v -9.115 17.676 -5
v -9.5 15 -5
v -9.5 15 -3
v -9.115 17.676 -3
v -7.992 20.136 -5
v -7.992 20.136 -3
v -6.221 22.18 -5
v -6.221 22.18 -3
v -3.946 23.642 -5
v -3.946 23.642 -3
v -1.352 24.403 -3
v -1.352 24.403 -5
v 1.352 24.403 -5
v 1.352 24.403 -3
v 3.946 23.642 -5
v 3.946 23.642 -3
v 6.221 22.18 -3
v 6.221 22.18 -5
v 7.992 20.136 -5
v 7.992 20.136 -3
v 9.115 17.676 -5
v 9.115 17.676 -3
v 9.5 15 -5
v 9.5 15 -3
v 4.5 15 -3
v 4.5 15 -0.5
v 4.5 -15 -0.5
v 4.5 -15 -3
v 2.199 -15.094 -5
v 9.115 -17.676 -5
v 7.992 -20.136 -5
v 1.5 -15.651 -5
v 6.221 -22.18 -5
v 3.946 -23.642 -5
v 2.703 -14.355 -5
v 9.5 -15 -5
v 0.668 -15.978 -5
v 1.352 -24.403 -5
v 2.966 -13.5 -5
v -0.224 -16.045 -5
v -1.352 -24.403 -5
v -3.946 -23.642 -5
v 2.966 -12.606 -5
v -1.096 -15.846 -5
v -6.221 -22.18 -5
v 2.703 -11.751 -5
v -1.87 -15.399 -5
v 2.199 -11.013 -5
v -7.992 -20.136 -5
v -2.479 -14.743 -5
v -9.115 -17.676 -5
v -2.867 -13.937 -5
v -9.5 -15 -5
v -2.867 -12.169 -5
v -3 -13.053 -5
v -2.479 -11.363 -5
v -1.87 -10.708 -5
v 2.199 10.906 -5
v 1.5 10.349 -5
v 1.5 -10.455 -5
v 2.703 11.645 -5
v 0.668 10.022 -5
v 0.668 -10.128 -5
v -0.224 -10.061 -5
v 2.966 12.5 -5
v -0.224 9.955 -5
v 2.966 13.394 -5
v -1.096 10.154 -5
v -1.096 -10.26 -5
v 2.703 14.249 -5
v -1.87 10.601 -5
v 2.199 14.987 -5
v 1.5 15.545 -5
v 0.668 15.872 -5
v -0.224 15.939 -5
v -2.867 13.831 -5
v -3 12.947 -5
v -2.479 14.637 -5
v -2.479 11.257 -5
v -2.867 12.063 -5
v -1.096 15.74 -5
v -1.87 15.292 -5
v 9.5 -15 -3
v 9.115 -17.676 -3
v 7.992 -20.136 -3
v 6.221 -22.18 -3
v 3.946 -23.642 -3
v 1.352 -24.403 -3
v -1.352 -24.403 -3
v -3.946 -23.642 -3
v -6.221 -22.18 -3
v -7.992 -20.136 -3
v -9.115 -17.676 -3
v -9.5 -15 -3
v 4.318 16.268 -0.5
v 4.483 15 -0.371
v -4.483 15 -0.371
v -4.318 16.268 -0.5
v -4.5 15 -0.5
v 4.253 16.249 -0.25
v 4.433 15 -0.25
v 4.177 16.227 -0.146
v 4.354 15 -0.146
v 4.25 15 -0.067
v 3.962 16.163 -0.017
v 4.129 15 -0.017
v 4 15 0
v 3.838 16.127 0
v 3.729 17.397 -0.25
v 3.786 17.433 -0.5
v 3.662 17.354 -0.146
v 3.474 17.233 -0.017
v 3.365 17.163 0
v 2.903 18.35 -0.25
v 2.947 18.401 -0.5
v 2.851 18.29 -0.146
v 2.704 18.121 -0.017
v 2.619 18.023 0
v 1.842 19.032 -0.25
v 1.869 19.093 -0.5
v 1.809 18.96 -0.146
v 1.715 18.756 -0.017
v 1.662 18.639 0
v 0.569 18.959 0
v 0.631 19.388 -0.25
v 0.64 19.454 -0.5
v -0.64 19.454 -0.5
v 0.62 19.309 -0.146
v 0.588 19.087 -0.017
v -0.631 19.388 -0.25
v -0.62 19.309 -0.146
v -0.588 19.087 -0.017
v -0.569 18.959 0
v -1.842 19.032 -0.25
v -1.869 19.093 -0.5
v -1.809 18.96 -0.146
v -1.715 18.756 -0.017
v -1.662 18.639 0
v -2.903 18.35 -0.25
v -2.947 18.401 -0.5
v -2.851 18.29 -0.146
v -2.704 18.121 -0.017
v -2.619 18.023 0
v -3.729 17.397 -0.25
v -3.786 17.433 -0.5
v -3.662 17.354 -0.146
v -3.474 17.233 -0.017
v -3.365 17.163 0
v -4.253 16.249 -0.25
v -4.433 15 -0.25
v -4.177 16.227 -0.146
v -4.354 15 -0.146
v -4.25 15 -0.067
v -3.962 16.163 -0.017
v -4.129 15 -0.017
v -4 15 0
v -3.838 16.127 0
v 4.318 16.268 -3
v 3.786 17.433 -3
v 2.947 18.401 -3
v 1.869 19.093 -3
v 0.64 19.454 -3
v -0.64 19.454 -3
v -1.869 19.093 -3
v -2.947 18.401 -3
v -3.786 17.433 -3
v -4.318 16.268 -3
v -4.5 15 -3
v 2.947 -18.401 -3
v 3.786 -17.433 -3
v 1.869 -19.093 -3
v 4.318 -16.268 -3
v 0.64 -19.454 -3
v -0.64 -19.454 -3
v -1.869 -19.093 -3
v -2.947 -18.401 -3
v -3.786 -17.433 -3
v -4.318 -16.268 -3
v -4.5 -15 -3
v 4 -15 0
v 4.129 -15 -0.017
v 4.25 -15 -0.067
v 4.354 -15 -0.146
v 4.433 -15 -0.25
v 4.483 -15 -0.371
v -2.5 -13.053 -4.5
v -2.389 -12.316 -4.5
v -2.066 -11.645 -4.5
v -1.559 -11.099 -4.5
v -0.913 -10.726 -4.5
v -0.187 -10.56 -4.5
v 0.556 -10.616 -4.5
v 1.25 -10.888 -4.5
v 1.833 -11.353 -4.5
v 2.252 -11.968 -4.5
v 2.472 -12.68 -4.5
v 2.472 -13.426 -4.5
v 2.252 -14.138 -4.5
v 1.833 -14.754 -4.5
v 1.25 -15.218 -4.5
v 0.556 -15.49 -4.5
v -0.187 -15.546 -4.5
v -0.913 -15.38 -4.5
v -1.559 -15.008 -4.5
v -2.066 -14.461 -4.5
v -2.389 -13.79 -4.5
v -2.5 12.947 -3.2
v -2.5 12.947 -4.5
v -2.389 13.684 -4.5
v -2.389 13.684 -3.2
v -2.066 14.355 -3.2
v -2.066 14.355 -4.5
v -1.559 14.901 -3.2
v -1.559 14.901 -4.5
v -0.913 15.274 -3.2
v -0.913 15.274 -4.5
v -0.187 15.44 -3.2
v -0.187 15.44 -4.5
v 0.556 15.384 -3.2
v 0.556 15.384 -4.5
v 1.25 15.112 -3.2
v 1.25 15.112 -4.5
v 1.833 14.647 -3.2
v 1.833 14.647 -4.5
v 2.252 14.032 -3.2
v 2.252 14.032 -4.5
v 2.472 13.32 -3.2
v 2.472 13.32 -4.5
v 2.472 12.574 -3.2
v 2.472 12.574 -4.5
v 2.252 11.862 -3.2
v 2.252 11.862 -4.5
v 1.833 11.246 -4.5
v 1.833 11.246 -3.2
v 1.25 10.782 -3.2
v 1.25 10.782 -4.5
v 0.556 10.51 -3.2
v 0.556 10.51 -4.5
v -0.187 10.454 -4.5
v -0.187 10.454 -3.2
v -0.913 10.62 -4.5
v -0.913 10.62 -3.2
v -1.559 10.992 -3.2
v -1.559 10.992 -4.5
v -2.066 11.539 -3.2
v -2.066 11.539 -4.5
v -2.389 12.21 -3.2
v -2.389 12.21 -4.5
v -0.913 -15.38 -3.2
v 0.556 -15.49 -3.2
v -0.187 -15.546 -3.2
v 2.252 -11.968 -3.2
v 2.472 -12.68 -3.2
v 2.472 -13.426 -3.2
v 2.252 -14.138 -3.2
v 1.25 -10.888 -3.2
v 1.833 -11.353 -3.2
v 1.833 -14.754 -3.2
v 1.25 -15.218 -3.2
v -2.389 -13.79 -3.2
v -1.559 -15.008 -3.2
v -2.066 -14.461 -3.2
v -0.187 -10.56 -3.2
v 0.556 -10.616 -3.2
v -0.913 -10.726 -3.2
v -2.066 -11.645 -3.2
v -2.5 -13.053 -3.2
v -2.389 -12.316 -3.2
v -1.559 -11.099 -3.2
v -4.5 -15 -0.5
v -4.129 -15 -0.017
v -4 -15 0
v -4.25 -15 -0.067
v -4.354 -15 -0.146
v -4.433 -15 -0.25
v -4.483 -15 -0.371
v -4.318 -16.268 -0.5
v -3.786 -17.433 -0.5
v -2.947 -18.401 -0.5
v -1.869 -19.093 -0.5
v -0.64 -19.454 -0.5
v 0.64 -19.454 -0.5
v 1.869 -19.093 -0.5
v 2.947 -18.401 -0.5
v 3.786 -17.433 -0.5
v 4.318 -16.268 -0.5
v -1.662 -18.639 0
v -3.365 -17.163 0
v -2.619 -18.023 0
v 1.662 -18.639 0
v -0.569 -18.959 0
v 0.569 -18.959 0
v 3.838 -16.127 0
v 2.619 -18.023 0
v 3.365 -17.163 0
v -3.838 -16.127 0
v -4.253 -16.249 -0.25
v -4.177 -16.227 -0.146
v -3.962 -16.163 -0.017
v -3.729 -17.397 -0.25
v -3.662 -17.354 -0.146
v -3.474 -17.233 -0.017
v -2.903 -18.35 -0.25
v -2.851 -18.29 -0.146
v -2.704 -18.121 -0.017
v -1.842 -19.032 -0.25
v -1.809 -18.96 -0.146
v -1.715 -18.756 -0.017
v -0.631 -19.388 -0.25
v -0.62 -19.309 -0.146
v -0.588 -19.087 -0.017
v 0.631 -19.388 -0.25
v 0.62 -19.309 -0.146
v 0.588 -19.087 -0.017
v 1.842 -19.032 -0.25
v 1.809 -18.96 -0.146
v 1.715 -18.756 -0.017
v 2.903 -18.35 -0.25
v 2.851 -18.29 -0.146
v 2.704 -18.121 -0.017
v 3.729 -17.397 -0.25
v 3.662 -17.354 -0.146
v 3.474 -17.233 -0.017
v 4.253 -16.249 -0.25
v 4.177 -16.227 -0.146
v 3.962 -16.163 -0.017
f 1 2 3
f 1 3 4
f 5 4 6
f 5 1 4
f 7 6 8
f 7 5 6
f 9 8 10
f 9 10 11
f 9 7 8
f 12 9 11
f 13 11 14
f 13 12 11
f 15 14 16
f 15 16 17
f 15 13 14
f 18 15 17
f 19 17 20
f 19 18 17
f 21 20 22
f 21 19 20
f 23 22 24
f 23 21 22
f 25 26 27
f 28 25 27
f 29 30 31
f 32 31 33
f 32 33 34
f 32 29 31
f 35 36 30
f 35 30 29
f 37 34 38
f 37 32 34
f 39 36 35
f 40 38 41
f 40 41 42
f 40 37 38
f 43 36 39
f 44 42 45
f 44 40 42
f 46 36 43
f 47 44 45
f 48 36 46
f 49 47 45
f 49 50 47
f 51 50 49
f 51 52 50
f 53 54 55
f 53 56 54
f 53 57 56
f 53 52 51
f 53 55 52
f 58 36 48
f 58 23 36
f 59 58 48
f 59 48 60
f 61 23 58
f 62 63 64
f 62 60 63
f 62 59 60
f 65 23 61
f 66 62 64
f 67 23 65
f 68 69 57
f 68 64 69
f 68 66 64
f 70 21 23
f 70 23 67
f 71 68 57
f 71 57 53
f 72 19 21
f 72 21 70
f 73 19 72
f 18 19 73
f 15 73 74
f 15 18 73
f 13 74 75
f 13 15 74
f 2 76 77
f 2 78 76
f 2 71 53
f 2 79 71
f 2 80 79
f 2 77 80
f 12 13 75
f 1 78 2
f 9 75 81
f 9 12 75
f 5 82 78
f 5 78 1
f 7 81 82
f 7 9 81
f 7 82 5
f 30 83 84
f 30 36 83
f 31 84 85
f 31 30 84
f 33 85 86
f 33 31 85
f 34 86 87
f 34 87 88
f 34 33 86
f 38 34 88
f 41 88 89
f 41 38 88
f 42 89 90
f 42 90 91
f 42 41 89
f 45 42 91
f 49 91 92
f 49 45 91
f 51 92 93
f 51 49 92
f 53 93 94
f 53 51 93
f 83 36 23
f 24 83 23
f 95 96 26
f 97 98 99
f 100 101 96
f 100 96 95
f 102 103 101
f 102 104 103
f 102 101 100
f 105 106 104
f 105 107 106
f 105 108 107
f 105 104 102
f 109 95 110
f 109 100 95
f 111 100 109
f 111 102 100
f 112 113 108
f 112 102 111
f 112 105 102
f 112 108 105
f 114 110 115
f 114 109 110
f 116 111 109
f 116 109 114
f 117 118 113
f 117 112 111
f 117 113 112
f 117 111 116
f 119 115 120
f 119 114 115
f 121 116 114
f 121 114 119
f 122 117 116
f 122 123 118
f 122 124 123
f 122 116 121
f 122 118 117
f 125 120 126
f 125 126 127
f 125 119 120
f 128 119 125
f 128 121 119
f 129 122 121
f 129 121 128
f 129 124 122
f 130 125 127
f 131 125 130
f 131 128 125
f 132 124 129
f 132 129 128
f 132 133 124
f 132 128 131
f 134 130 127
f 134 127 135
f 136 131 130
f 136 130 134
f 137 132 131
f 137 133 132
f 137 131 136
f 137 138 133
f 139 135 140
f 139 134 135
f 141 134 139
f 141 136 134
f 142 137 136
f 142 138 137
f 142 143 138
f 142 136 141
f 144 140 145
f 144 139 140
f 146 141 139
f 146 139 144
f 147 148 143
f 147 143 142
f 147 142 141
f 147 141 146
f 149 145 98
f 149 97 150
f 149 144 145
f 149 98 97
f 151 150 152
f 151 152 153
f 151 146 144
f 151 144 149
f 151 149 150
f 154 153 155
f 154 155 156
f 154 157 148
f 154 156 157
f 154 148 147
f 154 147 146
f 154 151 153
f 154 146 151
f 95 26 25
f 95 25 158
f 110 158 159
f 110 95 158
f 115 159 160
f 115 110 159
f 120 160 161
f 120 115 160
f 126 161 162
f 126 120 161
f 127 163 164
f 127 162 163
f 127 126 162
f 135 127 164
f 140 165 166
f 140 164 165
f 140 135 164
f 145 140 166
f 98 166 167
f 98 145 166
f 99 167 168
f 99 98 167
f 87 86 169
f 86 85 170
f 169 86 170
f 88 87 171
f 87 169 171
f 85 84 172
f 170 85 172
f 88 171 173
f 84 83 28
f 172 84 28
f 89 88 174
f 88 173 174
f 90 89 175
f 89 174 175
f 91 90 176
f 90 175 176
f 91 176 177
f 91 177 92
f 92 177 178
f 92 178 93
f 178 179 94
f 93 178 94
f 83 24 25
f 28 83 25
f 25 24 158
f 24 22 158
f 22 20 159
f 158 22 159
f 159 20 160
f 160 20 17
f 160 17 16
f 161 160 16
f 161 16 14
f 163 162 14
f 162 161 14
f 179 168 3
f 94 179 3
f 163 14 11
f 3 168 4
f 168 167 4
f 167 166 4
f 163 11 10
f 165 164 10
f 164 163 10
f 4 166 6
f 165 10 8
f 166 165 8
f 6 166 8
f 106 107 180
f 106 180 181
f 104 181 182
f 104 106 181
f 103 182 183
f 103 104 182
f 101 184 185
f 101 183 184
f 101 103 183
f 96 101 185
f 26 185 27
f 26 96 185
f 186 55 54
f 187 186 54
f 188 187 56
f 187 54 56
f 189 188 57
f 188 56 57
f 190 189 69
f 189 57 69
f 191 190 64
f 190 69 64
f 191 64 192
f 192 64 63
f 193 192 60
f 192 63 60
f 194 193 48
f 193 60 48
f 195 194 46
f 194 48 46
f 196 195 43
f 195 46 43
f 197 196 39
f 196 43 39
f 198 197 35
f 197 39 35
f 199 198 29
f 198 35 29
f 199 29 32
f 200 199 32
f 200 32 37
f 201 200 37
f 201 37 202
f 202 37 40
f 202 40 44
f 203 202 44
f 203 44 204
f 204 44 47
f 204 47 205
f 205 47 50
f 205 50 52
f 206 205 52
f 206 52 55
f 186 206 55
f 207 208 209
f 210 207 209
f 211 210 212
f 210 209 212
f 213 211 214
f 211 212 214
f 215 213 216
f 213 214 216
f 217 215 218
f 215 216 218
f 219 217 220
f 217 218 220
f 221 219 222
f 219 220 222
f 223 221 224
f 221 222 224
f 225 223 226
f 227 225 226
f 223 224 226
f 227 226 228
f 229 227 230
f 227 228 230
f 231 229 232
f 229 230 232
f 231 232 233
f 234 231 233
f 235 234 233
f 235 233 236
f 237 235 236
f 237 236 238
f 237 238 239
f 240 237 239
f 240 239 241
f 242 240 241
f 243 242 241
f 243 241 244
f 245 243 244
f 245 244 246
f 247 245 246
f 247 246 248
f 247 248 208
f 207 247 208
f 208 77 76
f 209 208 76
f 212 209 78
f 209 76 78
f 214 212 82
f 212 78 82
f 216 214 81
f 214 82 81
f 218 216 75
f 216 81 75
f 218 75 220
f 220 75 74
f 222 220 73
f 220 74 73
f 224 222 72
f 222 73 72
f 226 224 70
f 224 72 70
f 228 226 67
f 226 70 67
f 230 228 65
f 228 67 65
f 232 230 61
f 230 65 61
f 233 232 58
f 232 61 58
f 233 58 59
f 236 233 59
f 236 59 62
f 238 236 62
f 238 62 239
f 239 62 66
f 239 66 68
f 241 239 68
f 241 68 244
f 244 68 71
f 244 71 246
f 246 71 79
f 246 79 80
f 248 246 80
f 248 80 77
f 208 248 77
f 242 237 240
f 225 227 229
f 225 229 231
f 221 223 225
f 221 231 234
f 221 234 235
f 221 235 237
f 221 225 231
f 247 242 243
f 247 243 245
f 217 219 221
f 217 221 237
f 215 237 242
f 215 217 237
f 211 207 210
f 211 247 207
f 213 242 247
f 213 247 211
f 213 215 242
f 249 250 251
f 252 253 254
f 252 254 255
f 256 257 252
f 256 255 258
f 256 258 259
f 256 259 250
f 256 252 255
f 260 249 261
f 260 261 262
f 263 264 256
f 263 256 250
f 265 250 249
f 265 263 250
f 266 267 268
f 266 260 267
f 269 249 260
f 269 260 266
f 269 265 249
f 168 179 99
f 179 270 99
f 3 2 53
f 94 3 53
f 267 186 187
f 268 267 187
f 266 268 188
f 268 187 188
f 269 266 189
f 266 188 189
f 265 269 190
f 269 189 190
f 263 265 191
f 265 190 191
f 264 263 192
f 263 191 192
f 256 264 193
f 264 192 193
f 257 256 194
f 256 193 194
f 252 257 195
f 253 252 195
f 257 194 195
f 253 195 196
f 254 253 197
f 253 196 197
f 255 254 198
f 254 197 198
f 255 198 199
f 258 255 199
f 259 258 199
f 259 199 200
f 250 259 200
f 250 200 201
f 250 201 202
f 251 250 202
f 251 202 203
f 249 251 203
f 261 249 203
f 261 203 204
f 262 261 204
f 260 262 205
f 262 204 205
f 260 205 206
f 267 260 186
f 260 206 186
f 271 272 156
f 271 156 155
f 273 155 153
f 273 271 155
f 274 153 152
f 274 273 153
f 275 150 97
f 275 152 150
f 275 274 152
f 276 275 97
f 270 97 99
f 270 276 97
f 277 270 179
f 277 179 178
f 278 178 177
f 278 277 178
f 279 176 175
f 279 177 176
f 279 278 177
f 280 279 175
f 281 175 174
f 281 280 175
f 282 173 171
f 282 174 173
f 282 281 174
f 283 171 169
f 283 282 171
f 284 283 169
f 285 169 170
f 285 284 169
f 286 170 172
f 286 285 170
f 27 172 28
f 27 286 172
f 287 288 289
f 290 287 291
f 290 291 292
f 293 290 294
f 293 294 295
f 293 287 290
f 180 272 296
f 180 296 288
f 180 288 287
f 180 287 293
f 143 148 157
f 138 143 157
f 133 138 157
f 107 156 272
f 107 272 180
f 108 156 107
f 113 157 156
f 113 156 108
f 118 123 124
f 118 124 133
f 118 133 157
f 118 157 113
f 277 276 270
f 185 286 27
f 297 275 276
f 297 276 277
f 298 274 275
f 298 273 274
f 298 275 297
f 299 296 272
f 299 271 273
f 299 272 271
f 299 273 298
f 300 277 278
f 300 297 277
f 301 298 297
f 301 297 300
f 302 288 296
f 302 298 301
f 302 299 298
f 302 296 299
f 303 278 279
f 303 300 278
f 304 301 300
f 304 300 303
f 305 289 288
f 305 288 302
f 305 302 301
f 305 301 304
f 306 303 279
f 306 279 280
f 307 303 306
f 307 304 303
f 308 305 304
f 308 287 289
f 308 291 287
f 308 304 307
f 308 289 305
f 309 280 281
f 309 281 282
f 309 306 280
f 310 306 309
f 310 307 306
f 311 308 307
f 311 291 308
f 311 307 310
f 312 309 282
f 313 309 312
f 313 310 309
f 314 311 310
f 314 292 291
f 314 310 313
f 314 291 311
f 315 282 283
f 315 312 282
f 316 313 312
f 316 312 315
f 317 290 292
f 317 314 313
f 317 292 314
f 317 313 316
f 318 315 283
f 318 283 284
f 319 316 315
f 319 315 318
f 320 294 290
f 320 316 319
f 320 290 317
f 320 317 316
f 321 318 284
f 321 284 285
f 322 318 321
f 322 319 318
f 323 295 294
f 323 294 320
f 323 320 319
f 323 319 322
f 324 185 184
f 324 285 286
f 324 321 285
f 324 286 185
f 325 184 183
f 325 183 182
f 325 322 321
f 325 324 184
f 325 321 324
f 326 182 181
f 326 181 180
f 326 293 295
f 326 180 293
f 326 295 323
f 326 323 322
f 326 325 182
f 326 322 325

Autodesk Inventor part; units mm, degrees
ref_plane "YZ Plane" through (0, 0, 0) normal (1, 0, 0) x (0, 1, 0)
ref_plane "XZ Plane" through (0, 0, 0) normal (0, 1, 0) x (-1, 0, 0)
ref_plane "XY Plane" through (0, 0, 0) normal (0, 0, 1) x (1, 0, 0)
sketch "Sketch1" plane through (0, 0, 0) normal (0, 0, 1) x (1, 0, 0)
  line L0 (-4.5, 15) -> (4.5, 15)
  line L1 (4.5, 15) -> (4.5, -15)
  line L2 (4.5, -15) -> (-4.5, -15)
  line L3 (-4.5, -15) -> (-4.5, 15)
  line L4 (-4.5, 15) -> (4.5, -15) construction
  line L5 (4.5, 15) -> (-4.5, -15) construction
  circle A0 centre (0, 15) radius 4.5
  circle A1 centre (0, -15) radius 4.5
  point P0 (0, 0)
  point P1 (-4.5, 15)
  point P2 (-4.5, -15)
  dimension "d0" = 9
  dimension "d1" = 30
extrude "Extrusion1" add sketch "Sketch1" against normal blind 5
sketch "Sketch3" plane through (0, 0, -5) normal (0, 0, -1) x (-1, 0, 0)
  line L0 (4.5, -15) -> (4.5, 15) projected
  arc A0 (4.5, 15) -> (-4.5, 15) centre (0, 15) ccw projected
  line L1 (-4.5, 15) -> (-4.5, -15) projected
  arc A1 (-4.5, -15) -> (4.5, -15) centre (0, -15) ccw projected
  line L2 (-9.5, -15) -> (-9.5, 15)
  arc A2 (9.5, 15) -> (-9.5, 15) centre (0, 15) ccw
  line L3 (9.5, 15) -> (9.5, -15)
  arc A3 (-9.5, -15) -> (9.5, -15) centre (0, -15) ccw
  point P0 (0, 0)
  dimension "d9" = 5
extrude "Extrusion3" add sketch "Sketch3" against normal blind 2
sketch "Sketch5" plane through (0, 0, -5) normal (0, 0, -1) x (-1, 0, 0)
  line L0 (-9.5, 15) -> (-9.5, -15) projected
  arc A0 (-9.5, -15) -> (9.5, -15) centre (0, -15) ccw projected
  line L1 (9.5, -15) -> (9.5, 15) projected
  arc A1 (9.5, 15) -> (-9.5, 15) centre (0, 15) ccw projected
  circle A2 centre (0, 12.9469) radius 2.5
  circle A3 centre (0, -13.0531) radius 2.5
  point P0 (0, 0)
  dimension "d12" = 26
  dimension "d13" = 5
extrude "Extrusion4" cut sketch "Sketch5" against normal blind 1.8 contours A2 | A3
chamfer "Chamfer1" distance 0.5 angle 45 2 edges at (2.5, 12.9469, -5) (2.5, -13.0531, -5)
fillet "Fillet2" radius 0.5 4 edges at (0, 19.5, 0) (-4.5, 0, 0) (0, -19.5, 0) (4.5, 0, 0)
properties part number "KLEP_KNOPPEN"
